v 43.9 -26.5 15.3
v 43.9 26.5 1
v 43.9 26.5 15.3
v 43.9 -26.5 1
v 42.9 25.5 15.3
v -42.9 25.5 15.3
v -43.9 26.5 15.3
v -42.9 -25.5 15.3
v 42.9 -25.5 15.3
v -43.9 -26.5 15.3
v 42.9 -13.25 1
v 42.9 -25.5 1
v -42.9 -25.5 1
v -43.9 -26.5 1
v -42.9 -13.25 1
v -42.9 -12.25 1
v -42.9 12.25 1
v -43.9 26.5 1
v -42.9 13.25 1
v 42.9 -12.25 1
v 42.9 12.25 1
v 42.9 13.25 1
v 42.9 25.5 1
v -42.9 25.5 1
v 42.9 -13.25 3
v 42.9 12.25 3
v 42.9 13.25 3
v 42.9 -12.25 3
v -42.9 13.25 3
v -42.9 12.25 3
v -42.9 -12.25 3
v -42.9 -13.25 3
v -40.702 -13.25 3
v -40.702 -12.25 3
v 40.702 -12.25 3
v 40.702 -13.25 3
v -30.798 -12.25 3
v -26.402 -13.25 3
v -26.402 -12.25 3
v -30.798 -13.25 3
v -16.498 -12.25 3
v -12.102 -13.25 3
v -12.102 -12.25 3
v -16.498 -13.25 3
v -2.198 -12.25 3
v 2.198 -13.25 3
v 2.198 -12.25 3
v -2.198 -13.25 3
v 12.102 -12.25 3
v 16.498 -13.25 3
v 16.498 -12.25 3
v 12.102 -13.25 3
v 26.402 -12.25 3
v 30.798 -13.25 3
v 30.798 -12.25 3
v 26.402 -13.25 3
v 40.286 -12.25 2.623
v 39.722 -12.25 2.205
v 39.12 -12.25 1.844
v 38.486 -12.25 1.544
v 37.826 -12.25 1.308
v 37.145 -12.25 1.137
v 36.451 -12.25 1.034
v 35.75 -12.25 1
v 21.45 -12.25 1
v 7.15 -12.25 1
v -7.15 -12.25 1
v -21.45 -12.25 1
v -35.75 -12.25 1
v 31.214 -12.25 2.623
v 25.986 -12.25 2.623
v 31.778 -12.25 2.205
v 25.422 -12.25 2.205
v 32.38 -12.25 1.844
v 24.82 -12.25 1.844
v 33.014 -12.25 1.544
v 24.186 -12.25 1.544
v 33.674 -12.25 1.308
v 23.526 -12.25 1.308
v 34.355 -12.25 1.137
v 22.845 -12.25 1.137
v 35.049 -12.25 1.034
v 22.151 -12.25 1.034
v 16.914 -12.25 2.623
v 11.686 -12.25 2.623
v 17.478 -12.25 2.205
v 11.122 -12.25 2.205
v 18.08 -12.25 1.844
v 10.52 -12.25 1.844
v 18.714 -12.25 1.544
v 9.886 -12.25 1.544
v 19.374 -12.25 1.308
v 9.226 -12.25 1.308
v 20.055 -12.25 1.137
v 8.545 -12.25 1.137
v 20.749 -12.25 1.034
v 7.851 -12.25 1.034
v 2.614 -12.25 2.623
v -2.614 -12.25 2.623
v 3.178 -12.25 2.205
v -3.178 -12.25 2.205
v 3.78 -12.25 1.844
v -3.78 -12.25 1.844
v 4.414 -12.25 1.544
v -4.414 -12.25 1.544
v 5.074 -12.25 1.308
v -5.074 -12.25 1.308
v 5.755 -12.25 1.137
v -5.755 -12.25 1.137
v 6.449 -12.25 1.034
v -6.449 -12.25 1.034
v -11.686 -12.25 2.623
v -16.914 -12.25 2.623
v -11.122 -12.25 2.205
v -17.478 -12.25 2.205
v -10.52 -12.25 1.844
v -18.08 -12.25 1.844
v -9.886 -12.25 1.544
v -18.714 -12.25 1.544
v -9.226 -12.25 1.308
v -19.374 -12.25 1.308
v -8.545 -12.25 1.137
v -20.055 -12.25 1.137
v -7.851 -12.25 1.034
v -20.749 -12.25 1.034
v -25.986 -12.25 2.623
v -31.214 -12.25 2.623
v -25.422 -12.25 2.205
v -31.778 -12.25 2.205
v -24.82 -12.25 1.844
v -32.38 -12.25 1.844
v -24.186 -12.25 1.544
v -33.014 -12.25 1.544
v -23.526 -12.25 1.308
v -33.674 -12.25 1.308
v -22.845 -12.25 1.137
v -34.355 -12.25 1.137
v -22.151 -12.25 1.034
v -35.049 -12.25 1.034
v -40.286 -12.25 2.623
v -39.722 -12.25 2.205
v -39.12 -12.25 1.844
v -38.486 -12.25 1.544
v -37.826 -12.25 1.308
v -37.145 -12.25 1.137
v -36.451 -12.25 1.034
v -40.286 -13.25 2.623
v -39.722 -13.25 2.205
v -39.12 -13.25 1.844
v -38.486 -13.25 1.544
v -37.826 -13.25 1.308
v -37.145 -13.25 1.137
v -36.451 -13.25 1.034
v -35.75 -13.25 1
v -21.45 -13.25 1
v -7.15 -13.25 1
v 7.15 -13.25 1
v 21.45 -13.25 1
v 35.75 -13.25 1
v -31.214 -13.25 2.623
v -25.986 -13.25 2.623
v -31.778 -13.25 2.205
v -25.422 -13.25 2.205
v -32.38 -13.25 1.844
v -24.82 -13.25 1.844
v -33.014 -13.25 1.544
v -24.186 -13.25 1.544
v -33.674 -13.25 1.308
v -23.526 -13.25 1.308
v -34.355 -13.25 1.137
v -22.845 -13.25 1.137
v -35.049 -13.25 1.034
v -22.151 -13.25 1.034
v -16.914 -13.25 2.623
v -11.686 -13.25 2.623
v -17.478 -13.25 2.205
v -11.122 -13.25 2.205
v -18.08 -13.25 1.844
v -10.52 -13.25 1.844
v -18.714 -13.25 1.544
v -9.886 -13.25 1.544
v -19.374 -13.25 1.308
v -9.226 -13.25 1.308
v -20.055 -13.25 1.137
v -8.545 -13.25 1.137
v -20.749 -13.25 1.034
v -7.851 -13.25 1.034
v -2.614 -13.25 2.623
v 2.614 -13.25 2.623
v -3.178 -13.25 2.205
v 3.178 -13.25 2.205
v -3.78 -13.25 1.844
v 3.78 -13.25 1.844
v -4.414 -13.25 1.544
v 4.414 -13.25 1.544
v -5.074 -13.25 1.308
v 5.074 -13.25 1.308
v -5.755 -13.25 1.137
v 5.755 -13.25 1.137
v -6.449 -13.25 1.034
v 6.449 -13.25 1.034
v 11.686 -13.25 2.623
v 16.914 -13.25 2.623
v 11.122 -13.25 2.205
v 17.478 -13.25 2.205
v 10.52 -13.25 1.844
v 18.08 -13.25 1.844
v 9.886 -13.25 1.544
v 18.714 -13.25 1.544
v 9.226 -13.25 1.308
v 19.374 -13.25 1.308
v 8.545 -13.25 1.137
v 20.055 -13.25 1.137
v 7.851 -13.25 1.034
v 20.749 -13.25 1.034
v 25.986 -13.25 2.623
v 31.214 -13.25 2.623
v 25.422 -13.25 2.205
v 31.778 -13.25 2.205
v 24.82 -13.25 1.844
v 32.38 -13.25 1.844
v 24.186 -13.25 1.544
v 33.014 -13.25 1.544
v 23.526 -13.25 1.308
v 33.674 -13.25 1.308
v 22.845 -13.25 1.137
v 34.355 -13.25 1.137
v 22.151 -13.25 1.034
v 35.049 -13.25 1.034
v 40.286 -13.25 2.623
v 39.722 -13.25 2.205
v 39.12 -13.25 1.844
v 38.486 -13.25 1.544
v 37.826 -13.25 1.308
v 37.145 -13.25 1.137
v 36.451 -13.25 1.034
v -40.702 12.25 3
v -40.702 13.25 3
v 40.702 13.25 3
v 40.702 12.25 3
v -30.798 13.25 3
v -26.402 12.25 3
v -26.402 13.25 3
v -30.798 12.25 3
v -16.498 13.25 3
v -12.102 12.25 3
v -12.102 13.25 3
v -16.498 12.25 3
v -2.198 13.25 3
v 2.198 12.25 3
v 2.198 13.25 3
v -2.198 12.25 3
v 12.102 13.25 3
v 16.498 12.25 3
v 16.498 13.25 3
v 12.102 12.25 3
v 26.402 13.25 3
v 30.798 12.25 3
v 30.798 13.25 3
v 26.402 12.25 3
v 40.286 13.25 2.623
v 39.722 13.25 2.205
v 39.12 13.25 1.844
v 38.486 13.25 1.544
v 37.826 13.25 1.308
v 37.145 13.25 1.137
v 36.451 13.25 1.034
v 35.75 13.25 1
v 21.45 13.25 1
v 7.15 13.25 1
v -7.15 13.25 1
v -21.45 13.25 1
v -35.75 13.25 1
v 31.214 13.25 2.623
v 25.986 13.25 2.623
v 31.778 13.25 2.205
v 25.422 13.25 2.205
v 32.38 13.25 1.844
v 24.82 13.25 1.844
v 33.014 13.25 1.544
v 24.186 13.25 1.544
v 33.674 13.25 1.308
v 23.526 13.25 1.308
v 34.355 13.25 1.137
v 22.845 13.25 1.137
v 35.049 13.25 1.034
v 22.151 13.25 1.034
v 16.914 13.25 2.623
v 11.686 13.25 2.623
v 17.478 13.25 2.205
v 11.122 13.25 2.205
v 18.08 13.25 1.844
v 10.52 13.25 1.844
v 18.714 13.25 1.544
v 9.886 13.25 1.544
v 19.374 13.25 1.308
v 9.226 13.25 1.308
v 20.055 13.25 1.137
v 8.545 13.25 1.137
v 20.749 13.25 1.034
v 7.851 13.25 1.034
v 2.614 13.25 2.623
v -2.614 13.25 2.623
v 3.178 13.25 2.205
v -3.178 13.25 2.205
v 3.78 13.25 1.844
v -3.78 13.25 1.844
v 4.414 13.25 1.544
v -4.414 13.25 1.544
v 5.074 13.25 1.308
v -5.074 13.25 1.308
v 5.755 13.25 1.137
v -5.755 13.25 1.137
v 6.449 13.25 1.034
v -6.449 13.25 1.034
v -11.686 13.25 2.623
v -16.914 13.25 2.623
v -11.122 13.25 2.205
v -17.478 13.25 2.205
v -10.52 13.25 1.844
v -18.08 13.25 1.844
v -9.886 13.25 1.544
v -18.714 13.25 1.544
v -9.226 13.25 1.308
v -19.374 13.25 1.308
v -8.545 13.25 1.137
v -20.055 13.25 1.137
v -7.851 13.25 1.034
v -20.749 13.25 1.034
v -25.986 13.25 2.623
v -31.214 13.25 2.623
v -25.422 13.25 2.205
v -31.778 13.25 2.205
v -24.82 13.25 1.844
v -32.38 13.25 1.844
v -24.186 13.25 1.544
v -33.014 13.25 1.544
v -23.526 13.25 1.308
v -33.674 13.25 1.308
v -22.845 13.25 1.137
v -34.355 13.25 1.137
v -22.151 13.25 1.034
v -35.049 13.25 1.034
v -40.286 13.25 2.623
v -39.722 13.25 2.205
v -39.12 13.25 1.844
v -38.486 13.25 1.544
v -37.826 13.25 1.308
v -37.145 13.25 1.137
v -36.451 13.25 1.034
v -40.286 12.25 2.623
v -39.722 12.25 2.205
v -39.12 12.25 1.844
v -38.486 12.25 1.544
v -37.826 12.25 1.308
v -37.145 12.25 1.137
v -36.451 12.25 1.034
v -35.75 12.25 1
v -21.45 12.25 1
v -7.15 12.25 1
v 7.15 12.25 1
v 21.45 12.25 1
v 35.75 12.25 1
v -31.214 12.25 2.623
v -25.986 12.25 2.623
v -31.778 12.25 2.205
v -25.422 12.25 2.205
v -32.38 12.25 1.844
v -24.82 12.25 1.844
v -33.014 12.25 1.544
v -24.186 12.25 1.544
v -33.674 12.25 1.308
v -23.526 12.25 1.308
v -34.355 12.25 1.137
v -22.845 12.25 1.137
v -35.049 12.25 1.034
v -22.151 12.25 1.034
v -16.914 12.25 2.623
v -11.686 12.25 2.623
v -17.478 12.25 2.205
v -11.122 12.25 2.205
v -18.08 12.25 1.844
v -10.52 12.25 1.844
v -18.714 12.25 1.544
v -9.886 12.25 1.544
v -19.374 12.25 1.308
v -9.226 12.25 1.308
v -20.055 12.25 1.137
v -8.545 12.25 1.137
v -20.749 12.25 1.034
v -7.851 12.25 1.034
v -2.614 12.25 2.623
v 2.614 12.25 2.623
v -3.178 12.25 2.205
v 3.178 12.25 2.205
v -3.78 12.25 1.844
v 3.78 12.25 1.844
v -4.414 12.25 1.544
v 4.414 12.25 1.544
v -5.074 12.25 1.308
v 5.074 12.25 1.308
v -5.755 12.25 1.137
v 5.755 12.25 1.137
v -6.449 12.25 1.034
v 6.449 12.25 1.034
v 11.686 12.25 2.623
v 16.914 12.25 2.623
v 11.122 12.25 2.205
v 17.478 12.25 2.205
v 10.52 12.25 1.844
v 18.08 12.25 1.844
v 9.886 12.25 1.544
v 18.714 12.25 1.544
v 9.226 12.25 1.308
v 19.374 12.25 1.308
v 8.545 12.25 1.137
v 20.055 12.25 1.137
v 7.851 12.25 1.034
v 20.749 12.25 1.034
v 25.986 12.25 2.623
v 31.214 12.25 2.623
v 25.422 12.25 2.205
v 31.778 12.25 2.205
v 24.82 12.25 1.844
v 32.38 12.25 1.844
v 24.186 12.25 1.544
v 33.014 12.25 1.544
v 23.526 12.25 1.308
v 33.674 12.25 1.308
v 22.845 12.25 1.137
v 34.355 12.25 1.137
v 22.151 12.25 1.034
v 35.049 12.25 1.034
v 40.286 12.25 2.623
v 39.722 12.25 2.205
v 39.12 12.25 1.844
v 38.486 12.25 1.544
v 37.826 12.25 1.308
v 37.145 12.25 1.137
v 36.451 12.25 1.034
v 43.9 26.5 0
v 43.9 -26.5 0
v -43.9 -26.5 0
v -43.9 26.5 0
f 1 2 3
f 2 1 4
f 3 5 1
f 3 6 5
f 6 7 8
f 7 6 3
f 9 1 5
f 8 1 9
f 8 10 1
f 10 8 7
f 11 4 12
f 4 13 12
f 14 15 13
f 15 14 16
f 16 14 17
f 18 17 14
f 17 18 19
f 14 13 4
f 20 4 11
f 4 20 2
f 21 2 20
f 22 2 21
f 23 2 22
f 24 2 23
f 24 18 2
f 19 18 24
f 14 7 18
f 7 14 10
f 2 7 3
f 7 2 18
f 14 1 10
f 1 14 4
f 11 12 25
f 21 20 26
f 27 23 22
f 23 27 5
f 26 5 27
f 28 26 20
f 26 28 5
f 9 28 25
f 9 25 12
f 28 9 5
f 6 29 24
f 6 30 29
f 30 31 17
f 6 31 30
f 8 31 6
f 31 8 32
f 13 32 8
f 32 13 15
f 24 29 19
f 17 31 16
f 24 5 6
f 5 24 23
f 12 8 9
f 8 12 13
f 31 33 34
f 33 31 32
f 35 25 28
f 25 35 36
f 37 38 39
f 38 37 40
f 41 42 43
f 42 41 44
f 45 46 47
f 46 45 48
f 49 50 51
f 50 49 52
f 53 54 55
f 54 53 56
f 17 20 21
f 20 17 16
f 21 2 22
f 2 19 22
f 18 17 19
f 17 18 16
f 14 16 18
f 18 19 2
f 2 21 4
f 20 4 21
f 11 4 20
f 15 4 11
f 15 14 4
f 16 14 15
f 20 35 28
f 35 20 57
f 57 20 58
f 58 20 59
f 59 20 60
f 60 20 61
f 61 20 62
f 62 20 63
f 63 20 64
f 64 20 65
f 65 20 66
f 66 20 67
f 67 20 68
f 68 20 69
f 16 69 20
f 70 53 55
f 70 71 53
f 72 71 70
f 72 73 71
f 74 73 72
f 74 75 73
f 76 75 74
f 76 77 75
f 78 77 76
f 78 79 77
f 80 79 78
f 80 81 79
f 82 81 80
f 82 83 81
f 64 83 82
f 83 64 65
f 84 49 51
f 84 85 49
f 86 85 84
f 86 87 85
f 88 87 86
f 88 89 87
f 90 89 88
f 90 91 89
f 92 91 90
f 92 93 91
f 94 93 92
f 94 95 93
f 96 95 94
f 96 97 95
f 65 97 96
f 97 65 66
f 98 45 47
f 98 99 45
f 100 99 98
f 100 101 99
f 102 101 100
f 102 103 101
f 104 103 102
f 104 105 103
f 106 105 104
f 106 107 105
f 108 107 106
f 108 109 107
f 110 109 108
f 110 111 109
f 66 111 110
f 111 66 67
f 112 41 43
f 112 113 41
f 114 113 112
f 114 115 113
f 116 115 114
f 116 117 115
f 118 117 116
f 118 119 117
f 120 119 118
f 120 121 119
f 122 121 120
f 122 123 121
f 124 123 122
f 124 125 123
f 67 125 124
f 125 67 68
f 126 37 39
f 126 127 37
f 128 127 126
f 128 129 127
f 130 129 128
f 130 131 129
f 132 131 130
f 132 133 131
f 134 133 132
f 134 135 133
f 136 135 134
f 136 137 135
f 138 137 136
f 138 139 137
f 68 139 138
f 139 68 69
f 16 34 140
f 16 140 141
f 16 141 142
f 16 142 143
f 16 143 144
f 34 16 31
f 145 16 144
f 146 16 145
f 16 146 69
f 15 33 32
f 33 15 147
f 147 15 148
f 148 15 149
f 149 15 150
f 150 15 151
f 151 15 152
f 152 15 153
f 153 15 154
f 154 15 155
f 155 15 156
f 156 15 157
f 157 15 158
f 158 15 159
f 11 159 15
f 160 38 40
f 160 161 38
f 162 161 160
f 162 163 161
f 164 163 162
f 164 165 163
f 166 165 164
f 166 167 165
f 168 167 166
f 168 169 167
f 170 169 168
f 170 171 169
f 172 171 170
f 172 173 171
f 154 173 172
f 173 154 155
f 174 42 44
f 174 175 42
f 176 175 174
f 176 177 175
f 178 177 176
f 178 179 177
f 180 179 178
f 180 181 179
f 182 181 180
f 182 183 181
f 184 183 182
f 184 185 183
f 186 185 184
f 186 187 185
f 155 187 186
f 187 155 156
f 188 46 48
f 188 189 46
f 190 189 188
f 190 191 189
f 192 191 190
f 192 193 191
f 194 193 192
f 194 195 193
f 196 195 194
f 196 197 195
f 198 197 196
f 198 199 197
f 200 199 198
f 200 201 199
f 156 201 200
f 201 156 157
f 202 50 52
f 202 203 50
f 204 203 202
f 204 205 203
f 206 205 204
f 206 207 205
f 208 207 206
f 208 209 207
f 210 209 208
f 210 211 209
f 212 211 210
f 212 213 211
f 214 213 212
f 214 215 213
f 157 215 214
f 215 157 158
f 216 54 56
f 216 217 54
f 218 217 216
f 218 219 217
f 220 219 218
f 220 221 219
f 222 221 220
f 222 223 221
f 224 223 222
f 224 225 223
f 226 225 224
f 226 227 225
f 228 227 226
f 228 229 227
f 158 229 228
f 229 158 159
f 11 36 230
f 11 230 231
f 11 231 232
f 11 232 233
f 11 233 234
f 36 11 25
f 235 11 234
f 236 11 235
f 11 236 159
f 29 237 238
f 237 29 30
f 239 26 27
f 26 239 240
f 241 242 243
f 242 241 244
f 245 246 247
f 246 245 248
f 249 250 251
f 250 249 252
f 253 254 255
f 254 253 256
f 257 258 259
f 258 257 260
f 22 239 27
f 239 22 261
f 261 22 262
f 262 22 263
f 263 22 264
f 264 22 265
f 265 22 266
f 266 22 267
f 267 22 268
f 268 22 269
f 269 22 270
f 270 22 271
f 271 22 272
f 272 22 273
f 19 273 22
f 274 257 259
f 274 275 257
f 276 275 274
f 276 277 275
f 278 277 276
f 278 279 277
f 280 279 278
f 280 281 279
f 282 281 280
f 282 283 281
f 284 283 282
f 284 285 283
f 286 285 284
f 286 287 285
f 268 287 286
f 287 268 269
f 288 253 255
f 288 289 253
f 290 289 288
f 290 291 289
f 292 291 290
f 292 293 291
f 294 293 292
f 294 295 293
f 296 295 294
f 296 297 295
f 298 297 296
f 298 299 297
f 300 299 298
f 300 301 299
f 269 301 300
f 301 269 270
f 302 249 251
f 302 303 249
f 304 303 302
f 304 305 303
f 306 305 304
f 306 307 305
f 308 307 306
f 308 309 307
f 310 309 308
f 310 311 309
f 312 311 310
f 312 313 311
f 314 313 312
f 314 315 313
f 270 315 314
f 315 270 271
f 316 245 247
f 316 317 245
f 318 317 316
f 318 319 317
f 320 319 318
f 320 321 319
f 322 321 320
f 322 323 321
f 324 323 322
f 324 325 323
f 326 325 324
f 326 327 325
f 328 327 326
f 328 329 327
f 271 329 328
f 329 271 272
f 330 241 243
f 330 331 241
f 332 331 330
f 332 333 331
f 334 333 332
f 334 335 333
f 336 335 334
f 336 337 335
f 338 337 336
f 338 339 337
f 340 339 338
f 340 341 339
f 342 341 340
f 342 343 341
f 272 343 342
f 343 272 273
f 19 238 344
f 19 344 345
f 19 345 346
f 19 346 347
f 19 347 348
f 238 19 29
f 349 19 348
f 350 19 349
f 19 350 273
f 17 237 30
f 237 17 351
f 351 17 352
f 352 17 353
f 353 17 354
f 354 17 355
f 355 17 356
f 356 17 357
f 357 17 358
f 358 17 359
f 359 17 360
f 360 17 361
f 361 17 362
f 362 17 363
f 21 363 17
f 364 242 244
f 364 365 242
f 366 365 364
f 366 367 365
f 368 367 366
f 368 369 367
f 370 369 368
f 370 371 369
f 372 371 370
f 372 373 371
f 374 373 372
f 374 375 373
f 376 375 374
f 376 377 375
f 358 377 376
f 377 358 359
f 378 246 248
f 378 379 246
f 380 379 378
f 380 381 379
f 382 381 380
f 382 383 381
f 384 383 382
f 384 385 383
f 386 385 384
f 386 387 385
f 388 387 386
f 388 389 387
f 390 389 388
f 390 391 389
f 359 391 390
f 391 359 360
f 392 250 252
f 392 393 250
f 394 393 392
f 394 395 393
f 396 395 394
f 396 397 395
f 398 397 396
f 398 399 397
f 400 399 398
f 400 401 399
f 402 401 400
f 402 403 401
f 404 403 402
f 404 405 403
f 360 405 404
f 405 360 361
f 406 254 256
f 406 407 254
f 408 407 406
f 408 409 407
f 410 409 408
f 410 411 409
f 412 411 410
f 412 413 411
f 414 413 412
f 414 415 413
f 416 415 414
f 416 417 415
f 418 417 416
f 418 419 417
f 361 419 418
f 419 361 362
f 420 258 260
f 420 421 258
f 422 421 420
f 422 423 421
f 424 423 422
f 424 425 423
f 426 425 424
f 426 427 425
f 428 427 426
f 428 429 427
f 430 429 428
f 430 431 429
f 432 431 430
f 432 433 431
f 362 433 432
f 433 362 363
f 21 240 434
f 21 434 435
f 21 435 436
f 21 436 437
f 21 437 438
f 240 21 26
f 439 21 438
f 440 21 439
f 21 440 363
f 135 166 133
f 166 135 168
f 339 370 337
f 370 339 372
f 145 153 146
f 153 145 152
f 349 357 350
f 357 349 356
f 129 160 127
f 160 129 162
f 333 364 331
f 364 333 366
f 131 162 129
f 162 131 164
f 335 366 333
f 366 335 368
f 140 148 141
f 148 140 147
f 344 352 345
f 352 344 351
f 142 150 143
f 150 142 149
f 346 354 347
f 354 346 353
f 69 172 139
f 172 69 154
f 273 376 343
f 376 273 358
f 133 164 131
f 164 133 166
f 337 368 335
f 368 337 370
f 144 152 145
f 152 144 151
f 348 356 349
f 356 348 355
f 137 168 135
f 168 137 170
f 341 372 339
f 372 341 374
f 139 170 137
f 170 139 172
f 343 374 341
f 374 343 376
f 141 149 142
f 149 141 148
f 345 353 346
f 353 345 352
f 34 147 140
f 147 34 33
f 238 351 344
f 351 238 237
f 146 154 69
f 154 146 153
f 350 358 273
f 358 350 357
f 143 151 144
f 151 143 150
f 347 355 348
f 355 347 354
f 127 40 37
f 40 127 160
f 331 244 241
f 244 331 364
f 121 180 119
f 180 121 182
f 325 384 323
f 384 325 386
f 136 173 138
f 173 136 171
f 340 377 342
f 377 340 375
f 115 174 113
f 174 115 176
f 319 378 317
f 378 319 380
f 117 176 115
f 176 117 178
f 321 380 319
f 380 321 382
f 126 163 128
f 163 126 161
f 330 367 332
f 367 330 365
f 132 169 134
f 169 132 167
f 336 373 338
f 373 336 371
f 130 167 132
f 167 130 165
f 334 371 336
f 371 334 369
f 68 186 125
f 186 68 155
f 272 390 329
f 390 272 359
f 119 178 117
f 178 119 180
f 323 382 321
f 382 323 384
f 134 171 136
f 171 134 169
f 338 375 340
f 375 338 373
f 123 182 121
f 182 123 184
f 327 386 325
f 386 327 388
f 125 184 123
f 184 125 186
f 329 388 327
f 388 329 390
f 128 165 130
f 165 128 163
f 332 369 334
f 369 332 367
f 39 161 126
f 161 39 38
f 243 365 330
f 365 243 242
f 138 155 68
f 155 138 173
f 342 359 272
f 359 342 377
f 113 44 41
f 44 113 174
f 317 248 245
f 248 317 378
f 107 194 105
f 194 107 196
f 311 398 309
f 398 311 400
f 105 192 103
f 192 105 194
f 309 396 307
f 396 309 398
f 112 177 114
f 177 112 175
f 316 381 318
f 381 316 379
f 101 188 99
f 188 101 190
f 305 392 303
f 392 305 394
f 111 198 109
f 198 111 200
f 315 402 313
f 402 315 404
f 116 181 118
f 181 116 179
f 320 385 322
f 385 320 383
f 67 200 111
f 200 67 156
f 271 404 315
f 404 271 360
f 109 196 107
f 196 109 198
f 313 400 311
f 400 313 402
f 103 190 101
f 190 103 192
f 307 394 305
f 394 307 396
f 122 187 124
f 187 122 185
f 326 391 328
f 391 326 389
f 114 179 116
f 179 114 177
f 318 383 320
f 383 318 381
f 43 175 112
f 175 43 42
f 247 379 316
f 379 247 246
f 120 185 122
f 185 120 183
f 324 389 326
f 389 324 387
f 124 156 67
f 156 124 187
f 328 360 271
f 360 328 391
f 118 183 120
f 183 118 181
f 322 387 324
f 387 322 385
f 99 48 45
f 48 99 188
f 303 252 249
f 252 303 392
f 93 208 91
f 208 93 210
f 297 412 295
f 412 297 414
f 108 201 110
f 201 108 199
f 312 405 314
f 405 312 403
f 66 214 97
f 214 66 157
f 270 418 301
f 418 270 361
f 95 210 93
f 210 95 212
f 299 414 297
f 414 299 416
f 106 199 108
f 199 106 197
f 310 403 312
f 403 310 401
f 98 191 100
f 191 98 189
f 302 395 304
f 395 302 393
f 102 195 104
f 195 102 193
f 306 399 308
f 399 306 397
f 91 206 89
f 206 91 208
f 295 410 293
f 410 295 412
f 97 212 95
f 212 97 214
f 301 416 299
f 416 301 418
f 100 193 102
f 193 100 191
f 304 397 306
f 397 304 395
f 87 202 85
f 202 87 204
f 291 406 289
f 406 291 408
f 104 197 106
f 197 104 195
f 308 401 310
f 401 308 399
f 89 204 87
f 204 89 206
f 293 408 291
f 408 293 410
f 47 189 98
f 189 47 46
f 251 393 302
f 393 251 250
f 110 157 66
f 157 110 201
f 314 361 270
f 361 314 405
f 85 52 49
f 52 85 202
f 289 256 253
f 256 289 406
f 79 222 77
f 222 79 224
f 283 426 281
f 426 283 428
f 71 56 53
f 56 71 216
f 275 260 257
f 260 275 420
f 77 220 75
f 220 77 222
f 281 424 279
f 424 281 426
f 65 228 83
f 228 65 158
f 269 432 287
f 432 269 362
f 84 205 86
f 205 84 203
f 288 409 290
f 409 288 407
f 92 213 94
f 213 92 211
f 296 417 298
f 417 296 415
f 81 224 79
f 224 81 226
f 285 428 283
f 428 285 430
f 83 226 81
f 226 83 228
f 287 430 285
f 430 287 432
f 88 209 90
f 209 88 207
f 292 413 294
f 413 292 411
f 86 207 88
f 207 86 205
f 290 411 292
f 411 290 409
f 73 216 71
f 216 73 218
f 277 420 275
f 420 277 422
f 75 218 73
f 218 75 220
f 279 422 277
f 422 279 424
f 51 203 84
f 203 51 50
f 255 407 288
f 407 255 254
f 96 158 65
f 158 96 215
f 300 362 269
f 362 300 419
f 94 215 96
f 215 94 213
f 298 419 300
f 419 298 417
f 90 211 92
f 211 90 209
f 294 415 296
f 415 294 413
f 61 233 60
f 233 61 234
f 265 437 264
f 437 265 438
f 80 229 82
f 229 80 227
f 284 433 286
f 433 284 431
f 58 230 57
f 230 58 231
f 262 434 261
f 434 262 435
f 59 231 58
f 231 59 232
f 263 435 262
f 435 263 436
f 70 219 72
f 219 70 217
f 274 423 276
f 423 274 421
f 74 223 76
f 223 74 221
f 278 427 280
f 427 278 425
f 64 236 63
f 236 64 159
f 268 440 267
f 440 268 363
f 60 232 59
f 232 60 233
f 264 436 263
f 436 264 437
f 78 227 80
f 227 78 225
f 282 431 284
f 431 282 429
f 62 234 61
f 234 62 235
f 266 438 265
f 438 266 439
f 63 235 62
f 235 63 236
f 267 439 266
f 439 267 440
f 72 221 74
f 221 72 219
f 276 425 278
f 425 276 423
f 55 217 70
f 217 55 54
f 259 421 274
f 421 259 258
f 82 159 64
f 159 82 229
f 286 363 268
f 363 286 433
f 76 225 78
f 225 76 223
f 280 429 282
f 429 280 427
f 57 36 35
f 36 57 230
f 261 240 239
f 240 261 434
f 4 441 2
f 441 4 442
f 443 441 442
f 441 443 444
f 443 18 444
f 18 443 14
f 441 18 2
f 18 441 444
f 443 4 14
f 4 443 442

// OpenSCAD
shell_thickness = 1;

battery_height = 50.5 + 0.5;
battery_diameter = 14.1 + 0.2;

translate([0,0,shell_thickness/2]){
    cube([battery_diameter*6+2*shell_thickness,battery_height+2*shell_thickness,shell_thickness], center=true);
}

translate([0,0,battery_diameter/2+shell_thickness]){   
    difference() {
        cube([battery_diameter*6+2*shell_thickness,battery_height+2*shell_thickness,battery_diameter], center=true);
        cube([battery_diameter*6,battery_height,battery_diameter+0.01], center=true);
    }
}

difference() {
    translate([0,0,1+shell_thickness])
    {
        for (y = [-0.25*battery_height,0.25*battery_height]) {
            translate([0,y,0]){
                cube([battery_diameter*6,shell_thickness,2],center=true);
            }
        }
    }

    translate([0,0,battery_diameter/2+shell_thickness])
    {
        rotate([90,0,0])
        {
            for (x = [-2.5*battery_diameter,-1.5*battery_diameter,-0.5*battery_diameter,0.5*battery_diameter,1.5*battery_diameter,2.5*battery_diameter]) {
                translate([x,0,0]) {
                    cylinder(h=battery_height,d=battery_diameter, $fn=64, center=true);
                }
            }
        }
    }
}
